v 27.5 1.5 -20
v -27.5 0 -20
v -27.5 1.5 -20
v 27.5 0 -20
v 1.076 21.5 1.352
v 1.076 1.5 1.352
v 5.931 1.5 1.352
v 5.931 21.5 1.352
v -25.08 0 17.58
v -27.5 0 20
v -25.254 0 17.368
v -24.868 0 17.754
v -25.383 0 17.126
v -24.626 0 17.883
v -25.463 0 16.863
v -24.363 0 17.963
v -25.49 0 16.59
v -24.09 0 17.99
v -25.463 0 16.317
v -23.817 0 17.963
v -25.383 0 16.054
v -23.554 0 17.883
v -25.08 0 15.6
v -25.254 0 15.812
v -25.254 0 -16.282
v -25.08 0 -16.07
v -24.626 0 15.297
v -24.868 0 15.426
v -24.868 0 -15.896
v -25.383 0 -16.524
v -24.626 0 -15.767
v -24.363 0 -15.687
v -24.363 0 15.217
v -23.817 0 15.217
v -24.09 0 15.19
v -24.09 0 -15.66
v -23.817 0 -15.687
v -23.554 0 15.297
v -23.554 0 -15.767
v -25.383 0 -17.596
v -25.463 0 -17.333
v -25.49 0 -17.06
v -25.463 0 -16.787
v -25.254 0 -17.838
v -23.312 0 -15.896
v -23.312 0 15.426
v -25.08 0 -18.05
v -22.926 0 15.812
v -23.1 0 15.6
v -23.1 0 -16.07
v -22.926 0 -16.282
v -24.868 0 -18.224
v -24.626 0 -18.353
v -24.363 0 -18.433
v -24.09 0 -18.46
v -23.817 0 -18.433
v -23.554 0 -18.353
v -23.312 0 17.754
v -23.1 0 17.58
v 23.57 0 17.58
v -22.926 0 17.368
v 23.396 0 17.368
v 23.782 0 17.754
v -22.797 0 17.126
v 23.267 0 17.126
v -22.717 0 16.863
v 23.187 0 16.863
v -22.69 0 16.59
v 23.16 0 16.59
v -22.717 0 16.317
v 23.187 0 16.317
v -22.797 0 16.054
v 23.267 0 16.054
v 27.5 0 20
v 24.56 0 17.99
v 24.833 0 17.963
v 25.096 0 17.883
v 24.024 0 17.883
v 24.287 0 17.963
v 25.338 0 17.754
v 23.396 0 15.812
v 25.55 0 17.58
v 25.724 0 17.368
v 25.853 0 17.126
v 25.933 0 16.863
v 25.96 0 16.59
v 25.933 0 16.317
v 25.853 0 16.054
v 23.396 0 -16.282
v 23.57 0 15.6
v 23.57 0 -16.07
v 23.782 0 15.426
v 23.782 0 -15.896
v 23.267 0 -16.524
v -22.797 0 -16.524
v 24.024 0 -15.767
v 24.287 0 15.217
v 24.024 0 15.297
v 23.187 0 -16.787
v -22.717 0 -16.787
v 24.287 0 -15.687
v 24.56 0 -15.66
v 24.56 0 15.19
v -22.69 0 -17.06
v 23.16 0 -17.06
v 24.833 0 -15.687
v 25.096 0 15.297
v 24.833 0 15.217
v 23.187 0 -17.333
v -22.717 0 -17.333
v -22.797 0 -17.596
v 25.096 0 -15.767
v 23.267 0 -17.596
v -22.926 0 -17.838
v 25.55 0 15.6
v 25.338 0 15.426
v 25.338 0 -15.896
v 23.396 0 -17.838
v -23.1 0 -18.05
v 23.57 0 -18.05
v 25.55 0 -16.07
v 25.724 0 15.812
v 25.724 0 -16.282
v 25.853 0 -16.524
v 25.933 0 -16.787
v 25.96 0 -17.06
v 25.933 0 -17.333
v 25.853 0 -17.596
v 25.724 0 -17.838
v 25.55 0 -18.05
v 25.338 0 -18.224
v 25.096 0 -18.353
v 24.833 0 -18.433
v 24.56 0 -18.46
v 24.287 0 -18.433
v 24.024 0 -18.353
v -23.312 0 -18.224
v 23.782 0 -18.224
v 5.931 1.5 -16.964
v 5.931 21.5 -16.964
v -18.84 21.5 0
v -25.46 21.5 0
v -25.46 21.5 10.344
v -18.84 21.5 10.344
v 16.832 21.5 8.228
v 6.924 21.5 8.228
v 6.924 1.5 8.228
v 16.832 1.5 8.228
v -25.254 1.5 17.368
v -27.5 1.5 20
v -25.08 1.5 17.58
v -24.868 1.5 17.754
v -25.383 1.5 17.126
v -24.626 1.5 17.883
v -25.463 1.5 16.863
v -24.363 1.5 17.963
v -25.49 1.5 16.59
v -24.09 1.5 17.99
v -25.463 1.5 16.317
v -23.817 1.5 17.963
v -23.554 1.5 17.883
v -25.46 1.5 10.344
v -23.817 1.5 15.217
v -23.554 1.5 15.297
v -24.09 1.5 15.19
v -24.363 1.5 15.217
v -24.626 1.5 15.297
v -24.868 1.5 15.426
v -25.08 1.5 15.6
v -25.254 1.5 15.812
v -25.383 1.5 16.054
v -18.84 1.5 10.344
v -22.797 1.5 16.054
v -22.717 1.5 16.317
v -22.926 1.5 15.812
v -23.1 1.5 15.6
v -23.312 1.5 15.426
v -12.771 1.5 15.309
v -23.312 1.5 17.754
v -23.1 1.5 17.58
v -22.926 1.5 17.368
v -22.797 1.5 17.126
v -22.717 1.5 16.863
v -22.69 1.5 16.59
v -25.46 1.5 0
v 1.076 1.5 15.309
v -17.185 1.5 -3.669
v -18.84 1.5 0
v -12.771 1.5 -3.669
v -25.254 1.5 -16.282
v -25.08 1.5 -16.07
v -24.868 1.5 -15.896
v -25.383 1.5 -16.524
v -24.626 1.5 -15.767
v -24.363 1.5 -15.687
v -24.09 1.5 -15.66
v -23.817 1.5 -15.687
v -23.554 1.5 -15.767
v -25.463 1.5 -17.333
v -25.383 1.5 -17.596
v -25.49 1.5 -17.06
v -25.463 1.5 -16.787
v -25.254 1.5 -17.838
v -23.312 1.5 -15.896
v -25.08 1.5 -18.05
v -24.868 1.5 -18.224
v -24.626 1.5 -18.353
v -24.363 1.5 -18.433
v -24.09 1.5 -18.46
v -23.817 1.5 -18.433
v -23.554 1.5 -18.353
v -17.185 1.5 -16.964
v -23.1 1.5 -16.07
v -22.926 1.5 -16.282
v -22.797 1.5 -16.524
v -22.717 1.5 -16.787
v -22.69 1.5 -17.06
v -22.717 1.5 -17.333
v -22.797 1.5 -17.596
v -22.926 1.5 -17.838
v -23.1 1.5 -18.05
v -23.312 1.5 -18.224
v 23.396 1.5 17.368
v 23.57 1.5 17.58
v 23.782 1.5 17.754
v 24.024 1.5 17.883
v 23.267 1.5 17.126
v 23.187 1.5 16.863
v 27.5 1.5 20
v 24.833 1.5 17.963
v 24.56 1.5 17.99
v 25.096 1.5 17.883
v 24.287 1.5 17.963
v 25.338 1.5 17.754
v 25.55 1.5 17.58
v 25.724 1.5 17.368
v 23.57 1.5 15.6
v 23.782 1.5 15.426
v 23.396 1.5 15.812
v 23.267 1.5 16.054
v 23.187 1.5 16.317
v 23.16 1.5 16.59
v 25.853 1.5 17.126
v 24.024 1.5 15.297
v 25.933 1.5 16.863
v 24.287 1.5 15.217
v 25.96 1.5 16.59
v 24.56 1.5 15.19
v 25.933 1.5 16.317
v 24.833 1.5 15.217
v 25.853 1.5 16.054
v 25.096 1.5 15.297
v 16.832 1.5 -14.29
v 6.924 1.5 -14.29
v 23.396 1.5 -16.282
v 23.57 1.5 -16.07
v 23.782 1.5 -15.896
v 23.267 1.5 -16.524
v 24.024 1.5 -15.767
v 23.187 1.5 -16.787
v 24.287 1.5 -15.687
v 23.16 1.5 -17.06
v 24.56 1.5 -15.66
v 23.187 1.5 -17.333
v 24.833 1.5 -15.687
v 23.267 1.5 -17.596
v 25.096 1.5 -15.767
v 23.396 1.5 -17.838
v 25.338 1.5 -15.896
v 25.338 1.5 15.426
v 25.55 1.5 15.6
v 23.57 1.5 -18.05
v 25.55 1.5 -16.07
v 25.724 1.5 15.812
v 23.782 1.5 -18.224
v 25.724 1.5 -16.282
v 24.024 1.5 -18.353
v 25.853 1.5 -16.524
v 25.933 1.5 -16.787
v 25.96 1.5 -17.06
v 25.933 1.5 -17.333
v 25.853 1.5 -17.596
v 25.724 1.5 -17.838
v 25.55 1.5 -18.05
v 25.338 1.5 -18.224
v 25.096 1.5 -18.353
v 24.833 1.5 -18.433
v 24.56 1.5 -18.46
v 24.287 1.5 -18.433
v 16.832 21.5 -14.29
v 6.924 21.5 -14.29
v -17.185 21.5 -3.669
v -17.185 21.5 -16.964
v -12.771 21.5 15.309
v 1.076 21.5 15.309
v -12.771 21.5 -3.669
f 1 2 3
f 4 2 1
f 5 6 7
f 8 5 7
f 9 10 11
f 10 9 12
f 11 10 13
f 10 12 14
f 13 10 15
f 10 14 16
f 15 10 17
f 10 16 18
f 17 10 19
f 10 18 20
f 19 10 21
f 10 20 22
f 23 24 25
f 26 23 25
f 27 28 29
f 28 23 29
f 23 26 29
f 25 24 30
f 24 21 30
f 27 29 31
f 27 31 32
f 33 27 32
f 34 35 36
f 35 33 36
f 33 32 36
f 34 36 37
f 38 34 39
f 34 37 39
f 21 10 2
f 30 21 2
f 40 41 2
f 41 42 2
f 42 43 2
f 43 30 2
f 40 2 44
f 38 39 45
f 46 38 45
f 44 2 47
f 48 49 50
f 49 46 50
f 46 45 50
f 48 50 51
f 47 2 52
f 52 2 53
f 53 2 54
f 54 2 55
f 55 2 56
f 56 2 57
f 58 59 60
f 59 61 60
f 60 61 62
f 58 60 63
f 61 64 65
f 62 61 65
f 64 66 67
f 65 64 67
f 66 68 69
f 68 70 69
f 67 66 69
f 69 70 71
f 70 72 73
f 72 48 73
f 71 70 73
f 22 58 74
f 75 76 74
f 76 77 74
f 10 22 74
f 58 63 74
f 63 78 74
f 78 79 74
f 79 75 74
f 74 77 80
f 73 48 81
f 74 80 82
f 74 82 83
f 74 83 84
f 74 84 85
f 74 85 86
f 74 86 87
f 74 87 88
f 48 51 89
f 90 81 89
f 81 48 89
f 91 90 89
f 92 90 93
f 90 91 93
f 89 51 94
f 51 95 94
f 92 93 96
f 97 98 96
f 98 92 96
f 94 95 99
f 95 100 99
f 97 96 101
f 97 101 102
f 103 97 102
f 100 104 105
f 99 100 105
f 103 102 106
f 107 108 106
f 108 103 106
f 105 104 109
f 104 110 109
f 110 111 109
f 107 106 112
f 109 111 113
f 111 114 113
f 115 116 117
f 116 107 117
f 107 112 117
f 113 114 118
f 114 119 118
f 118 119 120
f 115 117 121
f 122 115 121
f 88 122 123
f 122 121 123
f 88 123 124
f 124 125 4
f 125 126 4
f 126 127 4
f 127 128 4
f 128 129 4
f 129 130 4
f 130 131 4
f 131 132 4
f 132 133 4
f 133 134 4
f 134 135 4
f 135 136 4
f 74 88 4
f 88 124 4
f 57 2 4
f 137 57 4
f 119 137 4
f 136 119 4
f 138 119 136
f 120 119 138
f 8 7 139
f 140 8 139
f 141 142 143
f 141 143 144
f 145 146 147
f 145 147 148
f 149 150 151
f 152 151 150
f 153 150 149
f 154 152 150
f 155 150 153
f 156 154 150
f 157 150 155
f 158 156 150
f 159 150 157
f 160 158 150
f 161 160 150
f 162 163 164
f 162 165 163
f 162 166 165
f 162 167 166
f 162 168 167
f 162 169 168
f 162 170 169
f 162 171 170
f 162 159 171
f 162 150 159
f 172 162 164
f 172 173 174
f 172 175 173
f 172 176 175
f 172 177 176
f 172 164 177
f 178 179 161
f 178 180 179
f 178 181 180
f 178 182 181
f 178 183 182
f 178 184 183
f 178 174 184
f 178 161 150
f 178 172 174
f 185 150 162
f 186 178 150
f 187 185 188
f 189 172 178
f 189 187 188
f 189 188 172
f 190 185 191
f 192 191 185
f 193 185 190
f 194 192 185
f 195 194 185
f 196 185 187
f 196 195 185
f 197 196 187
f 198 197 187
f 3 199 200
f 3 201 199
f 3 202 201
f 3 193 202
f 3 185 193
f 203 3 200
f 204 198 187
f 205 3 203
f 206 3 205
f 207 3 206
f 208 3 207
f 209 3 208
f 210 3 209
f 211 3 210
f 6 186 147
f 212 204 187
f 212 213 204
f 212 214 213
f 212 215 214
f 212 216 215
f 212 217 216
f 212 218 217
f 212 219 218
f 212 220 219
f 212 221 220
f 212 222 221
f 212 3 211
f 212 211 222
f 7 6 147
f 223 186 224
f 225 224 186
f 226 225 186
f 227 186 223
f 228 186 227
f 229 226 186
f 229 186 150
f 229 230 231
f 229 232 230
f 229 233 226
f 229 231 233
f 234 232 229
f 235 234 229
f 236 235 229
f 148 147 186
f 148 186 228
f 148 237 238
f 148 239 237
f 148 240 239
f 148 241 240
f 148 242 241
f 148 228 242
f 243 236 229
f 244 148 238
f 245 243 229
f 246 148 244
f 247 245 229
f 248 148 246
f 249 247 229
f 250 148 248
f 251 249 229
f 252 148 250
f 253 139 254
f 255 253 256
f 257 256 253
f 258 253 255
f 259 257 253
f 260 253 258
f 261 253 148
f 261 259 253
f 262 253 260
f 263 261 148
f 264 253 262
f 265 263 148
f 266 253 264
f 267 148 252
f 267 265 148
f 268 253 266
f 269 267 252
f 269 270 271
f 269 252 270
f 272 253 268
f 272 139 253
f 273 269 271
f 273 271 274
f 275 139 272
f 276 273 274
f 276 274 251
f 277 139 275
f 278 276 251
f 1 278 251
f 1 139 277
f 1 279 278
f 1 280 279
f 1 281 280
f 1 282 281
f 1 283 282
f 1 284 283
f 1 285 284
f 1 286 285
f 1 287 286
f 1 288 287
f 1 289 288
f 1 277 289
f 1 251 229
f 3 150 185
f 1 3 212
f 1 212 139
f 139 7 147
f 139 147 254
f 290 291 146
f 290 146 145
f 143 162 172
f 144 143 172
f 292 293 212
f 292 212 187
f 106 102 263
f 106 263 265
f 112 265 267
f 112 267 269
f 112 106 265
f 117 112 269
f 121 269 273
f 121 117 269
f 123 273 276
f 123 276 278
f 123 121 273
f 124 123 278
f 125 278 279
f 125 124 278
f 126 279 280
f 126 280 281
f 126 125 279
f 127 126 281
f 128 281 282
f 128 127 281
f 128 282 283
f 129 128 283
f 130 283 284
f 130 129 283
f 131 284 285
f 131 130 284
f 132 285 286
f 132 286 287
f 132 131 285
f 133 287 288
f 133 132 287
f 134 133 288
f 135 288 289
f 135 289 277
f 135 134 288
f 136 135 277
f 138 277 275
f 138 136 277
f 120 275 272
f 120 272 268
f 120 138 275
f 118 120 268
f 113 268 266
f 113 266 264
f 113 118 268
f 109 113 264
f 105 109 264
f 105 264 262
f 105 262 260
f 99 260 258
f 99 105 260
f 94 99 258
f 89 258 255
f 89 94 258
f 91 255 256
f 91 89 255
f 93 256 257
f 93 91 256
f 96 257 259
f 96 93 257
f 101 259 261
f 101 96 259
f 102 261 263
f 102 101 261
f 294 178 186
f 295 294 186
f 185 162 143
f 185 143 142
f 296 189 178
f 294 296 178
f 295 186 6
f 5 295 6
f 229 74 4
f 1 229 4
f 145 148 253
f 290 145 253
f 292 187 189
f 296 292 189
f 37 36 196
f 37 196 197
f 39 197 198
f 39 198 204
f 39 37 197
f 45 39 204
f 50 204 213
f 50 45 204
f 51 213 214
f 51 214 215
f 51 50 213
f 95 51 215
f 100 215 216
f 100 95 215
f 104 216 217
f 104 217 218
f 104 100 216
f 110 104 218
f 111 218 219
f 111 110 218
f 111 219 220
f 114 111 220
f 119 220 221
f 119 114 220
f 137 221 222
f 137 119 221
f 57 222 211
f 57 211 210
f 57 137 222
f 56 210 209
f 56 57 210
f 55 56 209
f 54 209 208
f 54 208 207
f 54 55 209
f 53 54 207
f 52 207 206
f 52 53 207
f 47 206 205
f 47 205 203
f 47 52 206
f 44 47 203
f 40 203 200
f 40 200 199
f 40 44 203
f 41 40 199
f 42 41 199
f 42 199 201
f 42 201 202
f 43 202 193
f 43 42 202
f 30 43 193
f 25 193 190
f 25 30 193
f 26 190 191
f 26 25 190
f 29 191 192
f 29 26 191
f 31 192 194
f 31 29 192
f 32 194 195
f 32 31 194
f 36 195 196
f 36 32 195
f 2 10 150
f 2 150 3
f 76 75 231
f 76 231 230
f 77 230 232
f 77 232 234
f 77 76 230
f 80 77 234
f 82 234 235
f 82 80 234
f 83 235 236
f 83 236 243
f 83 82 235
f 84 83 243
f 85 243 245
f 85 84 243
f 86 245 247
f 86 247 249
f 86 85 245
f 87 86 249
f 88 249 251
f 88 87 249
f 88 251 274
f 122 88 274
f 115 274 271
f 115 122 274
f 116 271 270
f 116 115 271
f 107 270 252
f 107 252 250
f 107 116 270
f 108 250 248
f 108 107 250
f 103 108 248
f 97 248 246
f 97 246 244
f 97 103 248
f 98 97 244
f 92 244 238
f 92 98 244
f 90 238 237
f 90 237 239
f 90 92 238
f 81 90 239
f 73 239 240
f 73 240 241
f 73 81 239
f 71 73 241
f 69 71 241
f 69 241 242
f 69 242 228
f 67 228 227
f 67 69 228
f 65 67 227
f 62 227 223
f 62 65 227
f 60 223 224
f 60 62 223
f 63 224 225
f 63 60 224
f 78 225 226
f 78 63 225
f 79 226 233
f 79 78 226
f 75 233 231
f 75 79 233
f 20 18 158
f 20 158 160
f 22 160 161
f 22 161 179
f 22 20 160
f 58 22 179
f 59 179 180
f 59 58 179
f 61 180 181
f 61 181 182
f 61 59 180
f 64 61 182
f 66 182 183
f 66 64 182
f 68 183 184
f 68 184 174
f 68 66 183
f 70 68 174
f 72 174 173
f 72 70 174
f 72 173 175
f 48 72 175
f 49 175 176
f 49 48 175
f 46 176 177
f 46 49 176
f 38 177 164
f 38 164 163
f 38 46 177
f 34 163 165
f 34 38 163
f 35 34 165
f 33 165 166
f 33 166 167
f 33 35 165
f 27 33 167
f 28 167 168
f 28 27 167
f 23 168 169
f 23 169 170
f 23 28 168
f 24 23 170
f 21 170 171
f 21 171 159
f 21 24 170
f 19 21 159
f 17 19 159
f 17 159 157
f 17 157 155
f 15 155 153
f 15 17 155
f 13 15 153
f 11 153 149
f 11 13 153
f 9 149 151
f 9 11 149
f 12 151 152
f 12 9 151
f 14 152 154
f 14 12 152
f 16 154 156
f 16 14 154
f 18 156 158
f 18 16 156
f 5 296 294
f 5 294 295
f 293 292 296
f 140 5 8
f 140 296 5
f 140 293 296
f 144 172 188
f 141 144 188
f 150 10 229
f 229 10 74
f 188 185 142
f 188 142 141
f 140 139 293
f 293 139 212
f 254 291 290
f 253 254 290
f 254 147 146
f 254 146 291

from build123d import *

# Parameters (mm, degrees)
SKETCH1_W           = 55
SKETCH1_H           = 40
SKETCH1_R           = 1.4
BOSS_EXTRUDE1_DEPTH = 1.5
SKETCH2_W           = 9.907742448
SKETCH2_H           = 22.517169438
SKETCH2_W_2         = 6.62013717
SKETCH2_H_2         = 10.343964327
BOSS_EXTRUDE2_DEPTH = 20


with BuildPart() as part:
    # Sketch1 → Boss-Extrude1 (new body)
    with BuildSketch(Plane(origin=(0, 0, 0), x_dir=(1, 0, 0), z_dir=(0, 1, 0))):
        Rectangle(SKETCH1_W, SKETCH1_H)
        with Locations(Location((-24.09, 17.06, 0), (0, 0, 270))):
            Circle(SKETCH1_R, mode=Mode.SUBTRACT)
        with Locations(Location((-24.09, -16.59, 0), (0, 0, 270))):
            Circle(SKETCH1_R, mode=Mode.SUBTRACT)
        with Locations(Location((24.56, -16.59, 0), (0, 0, 270))):
            Circle(SKETCH1_R, mode=Mode.SUBTRACT)
        with Locations(Location((24.56, 17.06, 0), (0, 0, 270))):
            Circle(SKETCH1_R, mode=Mode.SUBTRACT)
    extrude(amount=BOSS_EXTRUDE1_DEPTH)

    # Sketch2 → Boss-Extrude2 (add)
    with BuildSketch(Plane(origin=(0, 1.5, 0), x_dir=(1, 0, 0), z_dir=(0, 1, 0))):
        with Locations((11.877828391, 3.030915981)):
            Rectangle(SKETCH2_W, SKETCH2_H)
        Polygon((5.930539548, 16.964101497), (-17.184772736, 16.964101497), (-17.184772736, 3.668659348), (-12.771347956, 3.668659348), (-12.771347956, -15.309067205), (1.07577229, -15.309067205), (1.07577229, -1.351611339), (5.930539548, -1.351611339), align=None)
        with Locations((-22.149875613, -5.171982164)):
            Rectangle(SKETCH2_W_2, SKETCH2_H_2)
    extrude(amount=BOSS_EXTRUDE2_DEPTH)


solid = part.part
